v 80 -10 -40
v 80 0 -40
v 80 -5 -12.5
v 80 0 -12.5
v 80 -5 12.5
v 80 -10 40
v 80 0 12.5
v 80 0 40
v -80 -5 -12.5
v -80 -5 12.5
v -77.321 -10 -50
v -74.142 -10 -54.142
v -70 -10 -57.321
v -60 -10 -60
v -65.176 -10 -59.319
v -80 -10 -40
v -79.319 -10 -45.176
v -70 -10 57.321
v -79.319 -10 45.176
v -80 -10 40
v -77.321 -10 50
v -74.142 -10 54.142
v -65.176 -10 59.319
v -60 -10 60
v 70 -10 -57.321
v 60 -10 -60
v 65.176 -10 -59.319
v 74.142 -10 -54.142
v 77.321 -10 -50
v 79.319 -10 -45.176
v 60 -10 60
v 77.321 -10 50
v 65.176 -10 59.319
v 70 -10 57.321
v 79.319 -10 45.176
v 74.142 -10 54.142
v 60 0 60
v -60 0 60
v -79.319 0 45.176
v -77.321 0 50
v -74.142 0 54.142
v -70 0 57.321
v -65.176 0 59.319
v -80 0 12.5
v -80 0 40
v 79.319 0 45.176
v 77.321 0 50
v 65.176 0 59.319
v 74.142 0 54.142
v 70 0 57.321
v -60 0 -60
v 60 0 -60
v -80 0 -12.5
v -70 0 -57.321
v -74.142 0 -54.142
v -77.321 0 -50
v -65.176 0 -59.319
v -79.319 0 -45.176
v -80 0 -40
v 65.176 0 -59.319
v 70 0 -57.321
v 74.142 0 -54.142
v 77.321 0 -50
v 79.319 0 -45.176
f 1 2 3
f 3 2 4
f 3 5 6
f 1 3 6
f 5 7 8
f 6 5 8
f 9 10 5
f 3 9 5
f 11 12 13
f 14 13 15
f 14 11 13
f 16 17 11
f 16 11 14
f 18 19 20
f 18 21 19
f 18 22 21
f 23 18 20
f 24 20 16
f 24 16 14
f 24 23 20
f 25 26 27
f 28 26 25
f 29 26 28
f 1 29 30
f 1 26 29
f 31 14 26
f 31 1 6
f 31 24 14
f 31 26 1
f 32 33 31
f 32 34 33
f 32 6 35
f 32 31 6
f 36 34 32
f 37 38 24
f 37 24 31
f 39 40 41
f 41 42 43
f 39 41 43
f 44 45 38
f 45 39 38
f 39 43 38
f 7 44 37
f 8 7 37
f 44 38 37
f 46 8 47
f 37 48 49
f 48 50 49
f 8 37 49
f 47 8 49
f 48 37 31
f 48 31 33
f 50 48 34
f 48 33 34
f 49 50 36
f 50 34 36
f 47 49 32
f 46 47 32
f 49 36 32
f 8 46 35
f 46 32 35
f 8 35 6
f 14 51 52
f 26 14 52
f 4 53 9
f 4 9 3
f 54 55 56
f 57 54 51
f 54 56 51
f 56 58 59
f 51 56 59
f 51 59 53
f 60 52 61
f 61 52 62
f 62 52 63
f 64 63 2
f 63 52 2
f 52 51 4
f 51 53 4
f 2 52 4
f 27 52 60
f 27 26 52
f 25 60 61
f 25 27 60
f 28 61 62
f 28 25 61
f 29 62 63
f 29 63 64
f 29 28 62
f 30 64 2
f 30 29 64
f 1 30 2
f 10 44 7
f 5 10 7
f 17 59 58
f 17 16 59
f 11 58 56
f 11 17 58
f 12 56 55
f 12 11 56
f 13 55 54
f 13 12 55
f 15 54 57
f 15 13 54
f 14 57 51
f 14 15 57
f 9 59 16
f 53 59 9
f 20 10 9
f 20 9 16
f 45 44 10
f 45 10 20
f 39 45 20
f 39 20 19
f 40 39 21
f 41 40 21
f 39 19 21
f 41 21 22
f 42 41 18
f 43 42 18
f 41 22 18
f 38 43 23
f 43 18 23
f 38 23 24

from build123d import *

# Parameters (mm, degrees)
F0_W     = 160
F0_H     = 120
F2_DEPTH = 10
F1_W     = 170
F1_H     = 25
F3_DEPTH = 5
F4_R     = 20


with BuildPart() as f2:
    # F0 (on Front) → F2 (new body)
    with BuildSketch(Plane.XZ):
        Rectangle(F0_W, F0_H)
    extrude(amount=F2_DEPTH)

    # F1 (on Front) → F3 (cut)
    with BuildSketch(Plane.XZ):
        Rectangle(F1_W, F1_H)
    extrude(amount=F3_DEPTH, mode=Mode.SUBTRACT)

    # F4
    f4_edges = [f2.edges().sort_by_distance(p)[0] for p in [
        (80, -5, -60),
        (80, -5, 60),
        (-80, -5, 60),
        (-80, -5, -60),
    ]]
    fillet(f4_edges, radius=F4_R)


solid = f2.part
